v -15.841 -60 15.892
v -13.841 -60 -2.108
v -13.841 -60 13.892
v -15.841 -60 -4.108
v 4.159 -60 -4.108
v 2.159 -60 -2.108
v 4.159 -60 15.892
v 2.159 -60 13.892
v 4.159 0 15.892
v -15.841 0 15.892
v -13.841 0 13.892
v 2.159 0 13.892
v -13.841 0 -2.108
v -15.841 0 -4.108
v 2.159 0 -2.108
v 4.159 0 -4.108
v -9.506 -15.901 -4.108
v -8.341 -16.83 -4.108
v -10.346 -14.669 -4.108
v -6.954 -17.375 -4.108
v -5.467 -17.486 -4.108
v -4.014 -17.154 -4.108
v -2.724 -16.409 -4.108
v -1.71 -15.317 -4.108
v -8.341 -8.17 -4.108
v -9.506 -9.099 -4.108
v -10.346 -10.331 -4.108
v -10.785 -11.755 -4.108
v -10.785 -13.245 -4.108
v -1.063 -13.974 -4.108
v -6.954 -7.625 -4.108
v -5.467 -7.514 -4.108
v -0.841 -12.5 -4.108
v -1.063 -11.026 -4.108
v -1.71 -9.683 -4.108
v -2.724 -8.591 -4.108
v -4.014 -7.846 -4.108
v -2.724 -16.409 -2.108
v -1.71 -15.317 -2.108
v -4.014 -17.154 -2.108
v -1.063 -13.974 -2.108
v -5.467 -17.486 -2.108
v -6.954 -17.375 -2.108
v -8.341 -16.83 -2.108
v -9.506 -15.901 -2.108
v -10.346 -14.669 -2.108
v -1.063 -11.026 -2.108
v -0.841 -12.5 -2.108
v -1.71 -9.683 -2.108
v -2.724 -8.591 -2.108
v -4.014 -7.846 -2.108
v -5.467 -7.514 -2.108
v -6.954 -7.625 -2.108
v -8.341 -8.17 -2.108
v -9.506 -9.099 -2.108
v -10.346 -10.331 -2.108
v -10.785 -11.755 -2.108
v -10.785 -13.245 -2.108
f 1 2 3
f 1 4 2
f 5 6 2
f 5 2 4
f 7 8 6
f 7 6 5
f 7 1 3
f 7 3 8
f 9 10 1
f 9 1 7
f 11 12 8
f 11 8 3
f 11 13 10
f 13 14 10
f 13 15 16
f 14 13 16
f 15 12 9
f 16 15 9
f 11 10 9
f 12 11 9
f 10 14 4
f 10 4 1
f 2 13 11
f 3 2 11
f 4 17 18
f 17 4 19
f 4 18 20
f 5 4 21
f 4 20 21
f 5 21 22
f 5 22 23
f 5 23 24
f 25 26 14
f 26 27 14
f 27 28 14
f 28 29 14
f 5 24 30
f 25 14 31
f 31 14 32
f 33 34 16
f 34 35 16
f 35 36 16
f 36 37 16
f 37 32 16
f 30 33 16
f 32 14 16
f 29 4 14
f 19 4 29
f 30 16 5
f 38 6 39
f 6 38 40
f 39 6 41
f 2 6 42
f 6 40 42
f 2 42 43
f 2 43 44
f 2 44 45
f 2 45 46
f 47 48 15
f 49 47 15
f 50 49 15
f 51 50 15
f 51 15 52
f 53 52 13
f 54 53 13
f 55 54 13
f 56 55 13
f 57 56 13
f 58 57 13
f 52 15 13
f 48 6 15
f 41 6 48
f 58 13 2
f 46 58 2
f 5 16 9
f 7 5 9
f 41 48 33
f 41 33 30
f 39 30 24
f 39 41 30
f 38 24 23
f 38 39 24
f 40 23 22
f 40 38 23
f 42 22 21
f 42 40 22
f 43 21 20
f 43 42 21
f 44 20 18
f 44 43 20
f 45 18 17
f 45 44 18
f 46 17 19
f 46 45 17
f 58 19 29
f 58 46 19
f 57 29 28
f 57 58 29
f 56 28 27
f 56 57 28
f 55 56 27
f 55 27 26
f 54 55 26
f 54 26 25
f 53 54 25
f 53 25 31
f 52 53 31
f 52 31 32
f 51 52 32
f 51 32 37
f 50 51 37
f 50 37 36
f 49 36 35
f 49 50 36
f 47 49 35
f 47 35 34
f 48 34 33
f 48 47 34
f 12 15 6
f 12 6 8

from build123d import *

# Parameters (mm, degrees)
F0_W     = 20
F0_H     = 20
F1_DEPTH = 60
F2_W     = 16
F2_H     = 16
F3_DEPTH = 25
F4_R     = 5
F5_DEPTH = 25
F6_W     = 16
F6_H     = 16
F7_DEPTH = 35


with BuildPart() as f1:
    # F0 (on Front) → F1 (new body)
    with BuildSketch(Plane.XZ):
        with Locations((-5.841036, 5.892225)):
            Rectangle(F0_W, F0_H)
    extrude(amount=F1_DEPTH)

    # F2 (on face) → F3 (cut)
    with BuildSketch(Plane(origin=(0, 0, 0), x_dir=(-1, 0, 0), z_dir=(0, 1, 0))):
        with Locations((5.841036, 5.892225)):
            Rectangle(F2_W, F2_H)
    extrude(amount=-F3_DEPTH, mode=Mode.SUBTRACT)

    # F4 (on face) → F5 (cut)
    with BuildSketch(Plane(origin=(0, 0, 13.892225), x_dir=(1, 0, 0), z_dir=(0, 0, -1))):
        with Locations((-5.841036, 12.5)):
            Circle(F4_R)
    extrude(amount=F5_DEPTH, mode=Mode.SUBTRACT)

    # F6 (on face) → F7 (cut, through all)
    with BuildSketch(Plane(origin=(0, -25, 0), x_dir=(-1, 0, 0), z_dir=(0, 1, 0))):
        with Locations((5.841036, 5.892225)):
            Rectangle(F6_W, F6_H)
    extrude(amount=-F7_DEPTH, mode=Mode.SUBTRACT)


solid = f1.part
